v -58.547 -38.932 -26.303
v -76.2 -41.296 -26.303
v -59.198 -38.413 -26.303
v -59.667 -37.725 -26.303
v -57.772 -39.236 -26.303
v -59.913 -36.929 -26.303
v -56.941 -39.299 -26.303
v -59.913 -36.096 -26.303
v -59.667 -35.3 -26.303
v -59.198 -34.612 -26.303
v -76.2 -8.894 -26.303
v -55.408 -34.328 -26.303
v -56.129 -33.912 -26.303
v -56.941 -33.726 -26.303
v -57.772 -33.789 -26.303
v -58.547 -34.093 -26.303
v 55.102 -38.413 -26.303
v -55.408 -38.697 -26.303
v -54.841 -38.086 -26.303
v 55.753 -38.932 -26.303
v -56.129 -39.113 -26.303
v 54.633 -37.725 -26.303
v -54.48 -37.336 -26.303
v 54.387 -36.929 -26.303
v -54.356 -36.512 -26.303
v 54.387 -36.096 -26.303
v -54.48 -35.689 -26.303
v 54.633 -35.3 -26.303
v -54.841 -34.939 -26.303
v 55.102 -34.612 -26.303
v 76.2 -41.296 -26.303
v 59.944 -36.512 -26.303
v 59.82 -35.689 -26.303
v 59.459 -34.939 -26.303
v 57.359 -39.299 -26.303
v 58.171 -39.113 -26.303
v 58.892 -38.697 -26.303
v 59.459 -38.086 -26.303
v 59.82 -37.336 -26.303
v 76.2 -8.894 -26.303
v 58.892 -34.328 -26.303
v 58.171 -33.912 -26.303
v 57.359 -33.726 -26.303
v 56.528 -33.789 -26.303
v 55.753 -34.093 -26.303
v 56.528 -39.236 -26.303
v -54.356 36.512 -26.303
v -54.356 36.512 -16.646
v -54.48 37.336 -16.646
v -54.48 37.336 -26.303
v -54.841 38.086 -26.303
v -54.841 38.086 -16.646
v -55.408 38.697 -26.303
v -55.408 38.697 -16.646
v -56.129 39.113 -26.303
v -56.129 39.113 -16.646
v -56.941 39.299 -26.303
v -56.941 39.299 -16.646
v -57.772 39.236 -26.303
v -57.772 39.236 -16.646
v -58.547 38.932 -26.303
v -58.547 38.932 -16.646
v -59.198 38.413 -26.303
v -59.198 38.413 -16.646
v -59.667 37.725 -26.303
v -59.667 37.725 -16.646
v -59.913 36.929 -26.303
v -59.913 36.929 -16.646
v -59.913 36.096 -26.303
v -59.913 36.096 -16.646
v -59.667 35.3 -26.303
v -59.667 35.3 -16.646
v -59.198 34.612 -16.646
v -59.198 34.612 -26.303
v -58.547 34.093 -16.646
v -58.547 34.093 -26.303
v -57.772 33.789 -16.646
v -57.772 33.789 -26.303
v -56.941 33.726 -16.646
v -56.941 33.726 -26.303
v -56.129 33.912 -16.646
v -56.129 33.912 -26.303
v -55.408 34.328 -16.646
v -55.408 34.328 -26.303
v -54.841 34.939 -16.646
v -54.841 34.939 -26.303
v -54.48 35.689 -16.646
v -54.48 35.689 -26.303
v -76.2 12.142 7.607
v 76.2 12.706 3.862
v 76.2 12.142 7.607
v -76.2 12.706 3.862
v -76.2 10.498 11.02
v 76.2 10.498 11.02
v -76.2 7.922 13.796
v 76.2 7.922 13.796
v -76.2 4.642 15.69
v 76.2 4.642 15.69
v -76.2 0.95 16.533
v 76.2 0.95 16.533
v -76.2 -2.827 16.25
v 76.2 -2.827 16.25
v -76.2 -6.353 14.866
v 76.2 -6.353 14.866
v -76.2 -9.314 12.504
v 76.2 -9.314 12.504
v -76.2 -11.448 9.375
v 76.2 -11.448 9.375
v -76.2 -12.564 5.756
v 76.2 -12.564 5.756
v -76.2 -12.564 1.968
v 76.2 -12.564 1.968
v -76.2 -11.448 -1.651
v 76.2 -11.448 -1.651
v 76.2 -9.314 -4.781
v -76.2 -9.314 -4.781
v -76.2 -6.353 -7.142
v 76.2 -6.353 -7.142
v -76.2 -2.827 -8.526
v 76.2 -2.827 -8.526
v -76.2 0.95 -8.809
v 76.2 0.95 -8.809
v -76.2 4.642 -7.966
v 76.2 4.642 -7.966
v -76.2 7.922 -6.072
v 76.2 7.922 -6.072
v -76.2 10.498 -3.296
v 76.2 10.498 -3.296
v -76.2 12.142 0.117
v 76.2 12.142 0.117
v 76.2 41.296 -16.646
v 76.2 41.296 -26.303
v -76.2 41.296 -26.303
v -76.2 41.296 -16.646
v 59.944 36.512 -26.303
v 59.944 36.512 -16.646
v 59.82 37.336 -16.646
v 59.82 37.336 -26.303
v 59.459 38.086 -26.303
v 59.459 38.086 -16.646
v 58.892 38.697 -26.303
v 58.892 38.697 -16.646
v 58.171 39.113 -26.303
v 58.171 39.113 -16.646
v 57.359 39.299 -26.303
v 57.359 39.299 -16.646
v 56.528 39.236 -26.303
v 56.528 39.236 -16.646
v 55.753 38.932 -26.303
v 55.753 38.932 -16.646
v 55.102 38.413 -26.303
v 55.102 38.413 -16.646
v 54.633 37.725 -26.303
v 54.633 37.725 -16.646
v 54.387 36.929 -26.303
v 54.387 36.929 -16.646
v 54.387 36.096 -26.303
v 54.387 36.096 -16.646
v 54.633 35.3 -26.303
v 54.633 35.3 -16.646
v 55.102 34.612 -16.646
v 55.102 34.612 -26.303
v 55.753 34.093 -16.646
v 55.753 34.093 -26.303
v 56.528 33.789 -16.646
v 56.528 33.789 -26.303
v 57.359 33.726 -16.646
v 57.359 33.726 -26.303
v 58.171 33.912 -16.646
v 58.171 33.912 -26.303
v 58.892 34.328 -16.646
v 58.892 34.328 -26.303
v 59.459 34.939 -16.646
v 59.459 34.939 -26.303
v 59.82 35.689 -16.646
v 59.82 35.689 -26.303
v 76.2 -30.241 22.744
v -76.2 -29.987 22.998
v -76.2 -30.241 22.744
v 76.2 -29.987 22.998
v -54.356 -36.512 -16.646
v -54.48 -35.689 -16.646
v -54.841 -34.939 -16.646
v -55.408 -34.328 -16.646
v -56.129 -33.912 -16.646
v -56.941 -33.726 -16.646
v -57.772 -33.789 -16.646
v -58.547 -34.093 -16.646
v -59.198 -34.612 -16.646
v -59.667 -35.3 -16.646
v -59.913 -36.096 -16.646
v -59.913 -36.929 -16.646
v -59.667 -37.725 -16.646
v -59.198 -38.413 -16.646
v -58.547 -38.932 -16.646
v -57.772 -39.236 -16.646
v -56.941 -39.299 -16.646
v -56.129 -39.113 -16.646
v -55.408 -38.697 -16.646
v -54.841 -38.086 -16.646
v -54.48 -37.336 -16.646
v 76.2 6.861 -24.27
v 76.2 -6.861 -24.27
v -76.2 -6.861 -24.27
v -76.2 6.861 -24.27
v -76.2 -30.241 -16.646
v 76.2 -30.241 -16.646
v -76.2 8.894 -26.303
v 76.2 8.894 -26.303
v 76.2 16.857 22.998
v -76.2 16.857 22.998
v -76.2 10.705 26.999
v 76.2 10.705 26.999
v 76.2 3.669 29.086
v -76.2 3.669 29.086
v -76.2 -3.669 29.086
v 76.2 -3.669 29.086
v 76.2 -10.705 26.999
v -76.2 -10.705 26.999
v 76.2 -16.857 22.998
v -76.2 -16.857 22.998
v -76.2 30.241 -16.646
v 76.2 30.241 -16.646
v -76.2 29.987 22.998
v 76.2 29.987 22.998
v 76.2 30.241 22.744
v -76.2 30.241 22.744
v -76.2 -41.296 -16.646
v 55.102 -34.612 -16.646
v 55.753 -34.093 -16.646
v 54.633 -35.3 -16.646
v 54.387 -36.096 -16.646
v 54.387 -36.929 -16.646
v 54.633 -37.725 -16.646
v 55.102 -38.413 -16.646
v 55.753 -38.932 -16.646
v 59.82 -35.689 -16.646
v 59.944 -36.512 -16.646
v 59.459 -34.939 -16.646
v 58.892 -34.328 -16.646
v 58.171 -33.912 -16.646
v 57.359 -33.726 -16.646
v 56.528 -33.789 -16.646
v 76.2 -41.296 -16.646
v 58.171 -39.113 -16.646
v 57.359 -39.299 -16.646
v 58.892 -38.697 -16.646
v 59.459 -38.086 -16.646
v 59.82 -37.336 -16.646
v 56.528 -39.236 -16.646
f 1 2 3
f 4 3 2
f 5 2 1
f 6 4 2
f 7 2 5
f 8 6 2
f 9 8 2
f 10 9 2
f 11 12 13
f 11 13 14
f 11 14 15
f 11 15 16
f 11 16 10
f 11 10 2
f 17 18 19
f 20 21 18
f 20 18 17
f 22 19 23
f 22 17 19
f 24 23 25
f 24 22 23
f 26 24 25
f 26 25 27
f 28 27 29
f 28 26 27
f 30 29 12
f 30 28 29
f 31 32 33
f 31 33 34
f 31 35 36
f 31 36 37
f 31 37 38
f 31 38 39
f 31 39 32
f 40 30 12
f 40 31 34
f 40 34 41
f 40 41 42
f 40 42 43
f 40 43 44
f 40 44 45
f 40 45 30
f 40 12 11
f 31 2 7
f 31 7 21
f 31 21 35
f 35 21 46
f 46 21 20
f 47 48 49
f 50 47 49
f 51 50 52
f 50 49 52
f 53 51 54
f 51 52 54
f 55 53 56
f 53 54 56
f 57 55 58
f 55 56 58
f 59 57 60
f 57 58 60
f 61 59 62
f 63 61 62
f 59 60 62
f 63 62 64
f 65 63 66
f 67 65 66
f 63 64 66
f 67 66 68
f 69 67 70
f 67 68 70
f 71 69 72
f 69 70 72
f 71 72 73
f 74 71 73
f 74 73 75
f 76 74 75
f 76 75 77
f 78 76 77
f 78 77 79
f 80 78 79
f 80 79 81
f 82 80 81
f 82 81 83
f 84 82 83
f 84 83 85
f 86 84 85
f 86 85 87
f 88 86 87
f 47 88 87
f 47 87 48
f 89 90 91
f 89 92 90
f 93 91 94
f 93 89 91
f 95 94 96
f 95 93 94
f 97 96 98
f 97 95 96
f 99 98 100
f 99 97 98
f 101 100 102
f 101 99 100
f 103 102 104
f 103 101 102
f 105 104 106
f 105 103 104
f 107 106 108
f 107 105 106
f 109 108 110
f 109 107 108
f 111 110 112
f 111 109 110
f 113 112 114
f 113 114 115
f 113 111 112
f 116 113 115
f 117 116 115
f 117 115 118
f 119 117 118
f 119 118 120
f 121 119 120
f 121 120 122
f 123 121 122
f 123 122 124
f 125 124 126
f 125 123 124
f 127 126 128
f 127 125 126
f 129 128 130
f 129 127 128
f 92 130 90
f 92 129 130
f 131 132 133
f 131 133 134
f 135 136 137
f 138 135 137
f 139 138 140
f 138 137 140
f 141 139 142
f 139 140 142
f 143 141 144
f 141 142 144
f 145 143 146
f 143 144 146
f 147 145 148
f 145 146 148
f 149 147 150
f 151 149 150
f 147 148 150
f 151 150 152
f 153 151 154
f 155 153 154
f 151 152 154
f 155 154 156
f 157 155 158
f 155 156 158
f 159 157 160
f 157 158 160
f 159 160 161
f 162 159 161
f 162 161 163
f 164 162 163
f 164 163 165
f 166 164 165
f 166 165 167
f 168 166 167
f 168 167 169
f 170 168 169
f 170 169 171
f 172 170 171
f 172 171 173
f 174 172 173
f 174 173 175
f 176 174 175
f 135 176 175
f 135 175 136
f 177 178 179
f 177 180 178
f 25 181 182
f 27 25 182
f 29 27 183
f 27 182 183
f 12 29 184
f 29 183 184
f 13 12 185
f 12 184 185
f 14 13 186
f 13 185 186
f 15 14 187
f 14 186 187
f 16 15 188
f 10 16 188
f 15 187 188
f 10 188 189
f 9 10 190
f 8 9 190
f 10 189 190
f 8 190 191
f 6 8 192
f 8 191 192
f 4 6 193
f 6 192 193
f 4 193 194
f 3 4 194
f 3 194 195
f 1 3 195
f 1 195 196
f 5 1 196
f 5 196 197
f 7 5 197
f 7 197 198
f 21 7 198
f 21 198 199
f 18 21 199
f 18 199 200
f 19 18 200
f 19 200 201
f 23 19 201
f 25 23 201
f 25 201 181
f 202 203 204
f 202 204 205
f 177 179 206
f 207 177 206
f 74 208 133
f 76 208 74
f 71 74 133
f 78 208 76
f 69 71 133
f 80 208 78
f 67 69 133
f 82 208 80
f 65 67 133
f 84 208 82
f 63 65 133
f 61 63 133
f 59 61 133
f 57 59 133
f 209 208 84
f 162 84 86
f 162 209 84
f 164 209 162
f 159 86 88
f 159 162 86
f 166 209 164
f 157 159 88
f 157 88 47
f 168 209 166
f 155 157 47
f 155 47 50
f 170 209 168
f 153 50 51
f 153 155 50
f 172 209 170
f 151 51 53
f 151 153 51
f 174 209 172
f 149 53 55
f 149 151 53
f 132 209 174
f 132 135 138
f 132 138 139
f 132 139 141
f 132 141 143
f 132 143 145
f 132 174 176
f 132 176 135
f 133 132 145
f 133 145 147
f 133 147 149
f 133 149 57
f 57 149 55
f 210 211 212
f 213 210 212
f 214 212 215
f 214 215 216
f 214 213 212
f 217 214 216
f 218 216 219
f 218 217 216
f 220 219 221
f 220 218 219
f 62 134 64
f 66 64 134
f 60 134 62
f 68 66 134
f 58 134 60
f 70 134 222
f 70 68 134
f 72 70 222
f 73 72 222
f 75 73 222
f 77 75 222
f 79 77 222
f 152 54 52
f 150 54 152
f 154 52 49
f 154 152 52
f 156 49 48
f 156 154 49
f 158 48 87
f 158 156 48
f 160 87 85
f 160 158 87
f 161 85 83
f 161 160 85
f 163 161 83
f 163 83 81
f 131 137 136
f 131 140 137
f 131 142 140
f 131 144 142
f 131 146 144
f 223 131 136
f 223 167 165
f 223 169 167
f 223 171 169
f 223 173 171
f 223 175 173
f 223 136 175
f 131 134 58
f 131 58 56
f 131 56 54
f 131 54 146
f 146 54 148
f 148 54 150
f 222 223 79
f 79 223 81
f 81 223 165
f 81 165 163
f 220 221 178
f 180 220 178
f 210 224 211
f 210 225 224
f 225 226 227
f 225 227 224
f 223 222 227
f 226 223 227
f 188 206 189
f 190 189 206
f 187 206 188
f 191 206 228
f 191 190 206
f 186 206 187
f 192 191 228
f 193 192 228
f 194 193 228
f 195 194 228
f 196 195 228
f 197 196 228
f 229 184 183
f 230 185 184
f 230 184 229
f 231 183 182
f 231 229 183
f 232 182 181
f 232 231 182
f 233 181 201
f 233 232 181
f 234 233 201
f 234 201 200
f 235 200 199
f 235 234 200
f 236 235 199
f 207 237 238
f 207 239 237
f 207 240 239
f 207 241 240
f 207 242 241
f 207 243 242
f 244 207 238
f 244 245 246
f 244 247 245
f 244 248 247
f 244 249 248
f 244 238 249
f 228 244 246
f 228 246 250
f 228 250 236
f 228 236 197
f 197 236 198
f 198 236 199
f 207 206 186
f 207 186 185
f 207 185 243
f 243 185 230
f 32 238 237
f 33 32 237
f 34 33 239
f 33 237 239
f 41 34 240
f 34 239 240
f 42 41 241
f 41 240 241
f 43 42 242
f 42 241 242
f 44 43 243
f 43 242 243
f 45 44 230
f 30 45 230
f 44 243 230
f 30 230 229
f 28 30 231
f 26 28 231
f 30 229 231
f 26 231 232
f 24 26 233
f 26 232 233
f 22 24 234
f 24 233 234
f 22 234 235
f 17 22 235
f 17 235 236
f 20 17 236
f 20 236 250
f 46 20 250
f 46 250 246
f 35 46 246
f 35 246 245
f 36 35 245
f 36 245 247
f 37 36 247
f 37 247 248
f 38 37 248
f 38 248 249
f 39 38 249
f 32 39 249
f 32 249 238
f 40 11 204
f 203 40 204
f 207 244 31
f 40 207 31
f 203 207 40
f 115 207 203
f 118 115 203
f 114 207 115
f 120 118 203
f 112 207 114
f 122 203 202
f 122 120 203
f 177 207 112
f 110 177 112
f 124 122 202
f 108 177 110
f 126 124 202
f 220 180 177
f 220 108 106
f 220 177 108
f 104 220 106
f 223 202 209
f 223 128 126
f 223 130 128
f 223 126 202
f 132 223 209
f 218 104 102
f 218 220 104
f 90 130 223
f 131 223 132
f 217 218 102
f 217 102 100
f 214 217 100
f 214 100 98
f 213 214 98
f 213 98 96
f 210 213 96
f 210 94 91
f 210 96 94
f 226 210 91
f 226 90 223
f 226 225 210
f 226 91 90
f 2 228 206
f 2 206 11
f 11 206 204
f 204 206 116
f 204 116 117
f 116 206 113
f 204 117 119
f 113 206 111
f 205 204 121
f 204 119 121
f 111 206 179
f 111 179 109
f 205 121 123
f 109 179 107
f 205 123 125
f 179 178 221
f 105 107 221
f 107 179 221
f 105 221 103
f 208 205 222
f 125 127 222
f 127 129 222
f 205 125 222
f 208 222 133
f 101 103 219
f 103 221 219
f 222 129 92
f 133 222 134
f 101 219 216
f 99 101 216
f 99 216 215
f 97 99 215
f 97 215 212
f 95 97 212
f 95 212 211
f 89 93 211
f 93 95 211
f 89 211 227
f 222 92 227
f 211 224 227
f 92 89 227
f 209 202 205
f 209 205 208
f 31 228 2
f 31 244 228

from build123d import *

# Parameters (mm, degrees)
F0_R     = 12.7063531766
F1_DEPTH = 76.2
F2_R     = 2.794
F3_DEPTH = 9.6578284142


# Not quite as in the source:
# - ends of sketch curves that miss each other by under 0.0002 mm in the source are joined


with BuildPart() as f1:
    # F0 (on Right) → F1 (new body, symmetric)
    with BuildSketch(Plane.YZ):
        with BuildLine():
            Line((-41.2956478239, -26.3029134567), (-8.8944472236, -26.3029134567))
            Line((-8.8944472236, -26.3029134567), (-6.8614307154, -24.2698969485))
            Line((-6.8614307154, -24.2698969485), (6.8614307154, -24.2698969485))
            Line((6.8614307154, -24.2698969485), (8.8944472236, -26.3029134567))
            Line((8.8944472236, -26.3029134567), (41.2956478239, -26.3029134567))
            Line((41.2956478239, -26.3029134567), (41.2956478239, -16.6460850425))
            Line((41.2956478239, -16.6460850425), (30.2411205603, -16.6460850425))
            Line((30.2411205603, -16.6460850425), (30.2411205603, 22.7436098049))
            Line((30.2411205603, 22.7436098049), (29.9869934967, 22.9977368684))
            Line((29.9869934967, 22.9977368684), (16.8568834417, 22.9977368684))
            ThreePointArc((16.8568834417, 22.9977368684), (0, 29.3509134567), (-16.8568829775, 22.9977363401))
            Line((-16.8568829775, 22.9977363401), (-29.9869934967, 22.9977368684))
            Line((-29.9869934967, 22.9977368684), (-30.2411205603, 22.7436098049))
            Line((-30.2411205603, 22.7436098049), (-30.2411205603, -16.6460850425))
            Line((-30.2411205603, -16.6460850425), (-41.2956478239, -16.6460850425))
            Line((-41.2956478239, -16.6460850425), (-41.2956478239, -26.3029134567))
        make_face()
        with Locations((0, 3.8619689845)):
            Circle(F0_R, mode=Mode.SUBTRACT)
    extrude(amount=F1_DEPTH, both=True)

    # F2 (on face) → F3 (cut, through all)
    with BuildSketch(Plane.XY.offset(-16.6460850425)):
        with Locations((57.15, 36.5125)):
            Circle(F2_R)
        with Locations((-57.15, 36.5125)):
            Circle(F2_R)
        with Locations((-57.15, -36.5125)):
            Circle(F2_R)
        with Locations((57.15, -36.5125)):
            Circle(F2_R)
    extrude(amount=-F3_DEPTH, mode=Mode.SUBTRACT)


solid = f1.part
